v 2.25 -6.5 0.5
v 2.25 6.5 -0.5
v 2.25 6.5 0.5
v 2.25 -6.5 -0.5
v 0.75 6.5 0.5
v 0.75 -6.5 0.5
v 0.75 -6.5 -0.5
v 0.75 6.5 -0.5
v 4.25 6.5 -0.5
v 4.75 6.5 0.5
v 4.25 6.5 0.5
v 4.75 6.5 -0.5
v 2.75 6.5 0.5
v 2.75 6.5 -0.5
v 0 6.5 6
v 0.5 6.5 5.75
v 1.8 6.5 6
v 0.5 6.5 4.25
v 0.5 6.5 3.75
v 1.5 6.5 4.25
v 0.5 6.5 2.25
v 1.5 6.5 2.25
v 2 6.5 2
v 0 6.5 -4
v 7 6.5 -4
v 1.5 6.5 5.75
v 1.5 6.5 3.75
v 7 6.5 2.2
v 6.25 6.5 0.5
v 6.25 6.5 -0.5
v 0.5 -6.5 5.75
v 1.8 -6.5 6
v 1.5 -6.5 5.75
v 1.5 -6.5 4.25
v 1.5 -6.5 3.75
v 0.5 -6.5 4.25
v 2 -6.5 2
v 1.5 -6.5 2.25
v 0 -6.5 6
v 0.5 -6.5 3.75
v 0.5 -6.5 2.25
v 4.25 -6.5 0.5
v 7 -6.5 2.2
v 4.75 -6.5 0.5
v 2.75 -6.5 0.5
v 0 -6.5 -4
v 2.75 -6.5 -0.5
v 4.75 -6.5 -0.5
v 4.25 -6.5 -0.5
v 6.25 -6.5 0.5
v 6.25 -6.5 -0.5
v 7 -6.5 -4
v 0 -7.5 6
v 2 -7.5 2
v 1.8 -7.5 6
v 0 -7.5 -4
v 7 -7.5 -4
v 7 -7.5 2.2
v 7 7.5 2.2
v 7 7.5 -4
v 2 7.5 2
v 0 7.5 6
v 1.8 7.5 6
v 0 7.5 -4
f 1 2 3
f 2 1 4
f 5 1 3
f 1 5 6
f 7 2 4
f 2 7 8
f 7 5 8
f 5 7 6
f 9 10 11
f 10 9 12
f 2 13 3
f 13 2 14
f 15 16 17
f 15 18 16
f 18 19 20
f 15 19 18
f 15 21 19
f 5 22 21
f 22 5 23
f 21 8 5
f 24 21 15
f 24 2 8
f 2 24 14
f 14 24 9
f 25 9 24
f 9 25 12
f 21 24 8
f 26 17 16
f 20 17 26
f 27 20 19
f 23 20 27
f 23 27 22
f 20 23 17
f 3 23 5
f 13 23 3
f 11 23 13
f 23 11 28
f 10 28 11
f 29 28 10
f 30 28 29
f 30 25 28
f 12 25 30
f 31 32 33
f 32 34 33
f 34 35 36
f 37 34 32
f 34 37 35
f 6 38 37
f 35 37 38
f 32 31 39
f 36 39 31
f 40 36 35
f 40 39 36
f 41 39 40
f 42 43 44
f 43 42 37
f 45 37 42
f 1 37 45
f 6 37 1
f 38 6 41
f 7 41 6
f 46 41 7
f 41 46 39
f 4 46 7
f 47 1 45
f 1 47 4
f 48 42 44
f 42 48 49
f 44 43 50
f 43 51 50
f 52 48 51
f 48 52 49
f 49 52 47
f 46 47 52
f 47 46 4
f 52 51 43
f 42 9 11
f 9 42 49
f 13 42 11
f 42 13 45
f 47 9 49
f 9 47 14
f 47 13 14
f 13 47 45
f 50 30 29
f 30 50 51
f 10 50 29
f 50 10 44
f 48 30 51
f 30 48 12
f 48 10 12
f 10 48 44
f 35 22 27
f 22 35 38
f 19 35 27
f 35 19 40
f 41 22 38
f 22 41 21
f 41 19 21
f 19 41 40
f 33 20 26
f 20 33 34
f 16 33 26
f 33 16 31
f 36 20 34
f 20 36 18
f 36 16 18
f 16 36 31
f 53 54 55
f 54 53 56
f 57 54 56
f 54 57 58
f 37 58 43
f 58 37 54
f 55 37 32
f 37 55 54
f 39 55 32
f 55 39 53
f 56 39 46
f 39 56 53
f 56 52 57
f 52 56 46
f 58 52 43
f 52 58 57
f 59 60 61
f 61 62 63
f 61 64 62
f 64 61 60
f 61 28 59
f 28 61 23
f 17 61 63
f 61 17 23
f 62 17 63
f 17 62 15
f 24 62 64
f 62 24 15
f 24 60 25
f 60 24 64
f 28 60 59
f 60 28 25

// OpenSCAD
module Bench_01(){

    color("gray")
    translate([0,-7,0])
    rotate([90,0,0])
    linear_extrude(1, scale = 1, center = true)
    polygon(points=[[0,-4],[7,-4],[7,2.2],[2,2],[1.8,6],[0,6]]);
             
    translate([0,7,0])    
    color("gray")
    rotate([90,0,0])
    linear_extrude(1, scale = 1, center = true)
    polygon(points=[[0,-4],[7,-4],[7,2.2],[2,2],[1.8,6],[0,6]]);     

    color("#c69874"){
    translate([1.5,0,0]) 
    cube([1.5,13,1], center = true);

    translate([3.5,0,0]) 
    cube([1.5,13,1], center = true);

    translate([5.5,0,0]) 
    cube([1.5,13,1], center = true);


    translate([1,0,3]) 
    cube([1,13,1.5], center = true);

    translate([1,0,5]) 
    cube([1,13,1.5], center = true);
    }

}


Bench_01();


// Written by Nicolì Angelo (Gengio) 2024: 
// MIT License


//Permission is hereby granted, free of charge, to any person obtaining a copy of this software and associated documentation files (the "Software"), to deal in the Software without restriction, including without limitation the rights to use, copy, modify, merge, publish, distribute, sublicense, and/or sell copies of the Software, and to permit persons to whom the Software is furnished to do so, subject to the following conditions:

//The above copyright notice and this permission notice shall be included in all copies or substantial portions of the Software.

//THE SOFTWARE IS PROVIDED "AS IS", WITHOUT WARRANTY OF ANY KIND, EXPRESS OR IMPLIED, INCLUDING BUT NOT LIMITED TO THE WARRANTIES OF MERCHANTABILITY, FITNESS FOR A PARTICULAR PURPOSE AND NONINFRINGEMENT. IN NO EVENT SHALL THE AUTHORS OR COPYRIGHT HOLDERS BE LIABLE FOR ANY CLAIM, DAMAGES OR OTHER LIABILITY, WHETHER IN AN ACTION OF CONTRACT, TORT OR OTHERWISE, ARISING FROM, OUT OF OR IN CONNECTION WITH THE SOFTWARE OR THE USE OR OTHER DEALINGS IN THE SOFTWARE.
